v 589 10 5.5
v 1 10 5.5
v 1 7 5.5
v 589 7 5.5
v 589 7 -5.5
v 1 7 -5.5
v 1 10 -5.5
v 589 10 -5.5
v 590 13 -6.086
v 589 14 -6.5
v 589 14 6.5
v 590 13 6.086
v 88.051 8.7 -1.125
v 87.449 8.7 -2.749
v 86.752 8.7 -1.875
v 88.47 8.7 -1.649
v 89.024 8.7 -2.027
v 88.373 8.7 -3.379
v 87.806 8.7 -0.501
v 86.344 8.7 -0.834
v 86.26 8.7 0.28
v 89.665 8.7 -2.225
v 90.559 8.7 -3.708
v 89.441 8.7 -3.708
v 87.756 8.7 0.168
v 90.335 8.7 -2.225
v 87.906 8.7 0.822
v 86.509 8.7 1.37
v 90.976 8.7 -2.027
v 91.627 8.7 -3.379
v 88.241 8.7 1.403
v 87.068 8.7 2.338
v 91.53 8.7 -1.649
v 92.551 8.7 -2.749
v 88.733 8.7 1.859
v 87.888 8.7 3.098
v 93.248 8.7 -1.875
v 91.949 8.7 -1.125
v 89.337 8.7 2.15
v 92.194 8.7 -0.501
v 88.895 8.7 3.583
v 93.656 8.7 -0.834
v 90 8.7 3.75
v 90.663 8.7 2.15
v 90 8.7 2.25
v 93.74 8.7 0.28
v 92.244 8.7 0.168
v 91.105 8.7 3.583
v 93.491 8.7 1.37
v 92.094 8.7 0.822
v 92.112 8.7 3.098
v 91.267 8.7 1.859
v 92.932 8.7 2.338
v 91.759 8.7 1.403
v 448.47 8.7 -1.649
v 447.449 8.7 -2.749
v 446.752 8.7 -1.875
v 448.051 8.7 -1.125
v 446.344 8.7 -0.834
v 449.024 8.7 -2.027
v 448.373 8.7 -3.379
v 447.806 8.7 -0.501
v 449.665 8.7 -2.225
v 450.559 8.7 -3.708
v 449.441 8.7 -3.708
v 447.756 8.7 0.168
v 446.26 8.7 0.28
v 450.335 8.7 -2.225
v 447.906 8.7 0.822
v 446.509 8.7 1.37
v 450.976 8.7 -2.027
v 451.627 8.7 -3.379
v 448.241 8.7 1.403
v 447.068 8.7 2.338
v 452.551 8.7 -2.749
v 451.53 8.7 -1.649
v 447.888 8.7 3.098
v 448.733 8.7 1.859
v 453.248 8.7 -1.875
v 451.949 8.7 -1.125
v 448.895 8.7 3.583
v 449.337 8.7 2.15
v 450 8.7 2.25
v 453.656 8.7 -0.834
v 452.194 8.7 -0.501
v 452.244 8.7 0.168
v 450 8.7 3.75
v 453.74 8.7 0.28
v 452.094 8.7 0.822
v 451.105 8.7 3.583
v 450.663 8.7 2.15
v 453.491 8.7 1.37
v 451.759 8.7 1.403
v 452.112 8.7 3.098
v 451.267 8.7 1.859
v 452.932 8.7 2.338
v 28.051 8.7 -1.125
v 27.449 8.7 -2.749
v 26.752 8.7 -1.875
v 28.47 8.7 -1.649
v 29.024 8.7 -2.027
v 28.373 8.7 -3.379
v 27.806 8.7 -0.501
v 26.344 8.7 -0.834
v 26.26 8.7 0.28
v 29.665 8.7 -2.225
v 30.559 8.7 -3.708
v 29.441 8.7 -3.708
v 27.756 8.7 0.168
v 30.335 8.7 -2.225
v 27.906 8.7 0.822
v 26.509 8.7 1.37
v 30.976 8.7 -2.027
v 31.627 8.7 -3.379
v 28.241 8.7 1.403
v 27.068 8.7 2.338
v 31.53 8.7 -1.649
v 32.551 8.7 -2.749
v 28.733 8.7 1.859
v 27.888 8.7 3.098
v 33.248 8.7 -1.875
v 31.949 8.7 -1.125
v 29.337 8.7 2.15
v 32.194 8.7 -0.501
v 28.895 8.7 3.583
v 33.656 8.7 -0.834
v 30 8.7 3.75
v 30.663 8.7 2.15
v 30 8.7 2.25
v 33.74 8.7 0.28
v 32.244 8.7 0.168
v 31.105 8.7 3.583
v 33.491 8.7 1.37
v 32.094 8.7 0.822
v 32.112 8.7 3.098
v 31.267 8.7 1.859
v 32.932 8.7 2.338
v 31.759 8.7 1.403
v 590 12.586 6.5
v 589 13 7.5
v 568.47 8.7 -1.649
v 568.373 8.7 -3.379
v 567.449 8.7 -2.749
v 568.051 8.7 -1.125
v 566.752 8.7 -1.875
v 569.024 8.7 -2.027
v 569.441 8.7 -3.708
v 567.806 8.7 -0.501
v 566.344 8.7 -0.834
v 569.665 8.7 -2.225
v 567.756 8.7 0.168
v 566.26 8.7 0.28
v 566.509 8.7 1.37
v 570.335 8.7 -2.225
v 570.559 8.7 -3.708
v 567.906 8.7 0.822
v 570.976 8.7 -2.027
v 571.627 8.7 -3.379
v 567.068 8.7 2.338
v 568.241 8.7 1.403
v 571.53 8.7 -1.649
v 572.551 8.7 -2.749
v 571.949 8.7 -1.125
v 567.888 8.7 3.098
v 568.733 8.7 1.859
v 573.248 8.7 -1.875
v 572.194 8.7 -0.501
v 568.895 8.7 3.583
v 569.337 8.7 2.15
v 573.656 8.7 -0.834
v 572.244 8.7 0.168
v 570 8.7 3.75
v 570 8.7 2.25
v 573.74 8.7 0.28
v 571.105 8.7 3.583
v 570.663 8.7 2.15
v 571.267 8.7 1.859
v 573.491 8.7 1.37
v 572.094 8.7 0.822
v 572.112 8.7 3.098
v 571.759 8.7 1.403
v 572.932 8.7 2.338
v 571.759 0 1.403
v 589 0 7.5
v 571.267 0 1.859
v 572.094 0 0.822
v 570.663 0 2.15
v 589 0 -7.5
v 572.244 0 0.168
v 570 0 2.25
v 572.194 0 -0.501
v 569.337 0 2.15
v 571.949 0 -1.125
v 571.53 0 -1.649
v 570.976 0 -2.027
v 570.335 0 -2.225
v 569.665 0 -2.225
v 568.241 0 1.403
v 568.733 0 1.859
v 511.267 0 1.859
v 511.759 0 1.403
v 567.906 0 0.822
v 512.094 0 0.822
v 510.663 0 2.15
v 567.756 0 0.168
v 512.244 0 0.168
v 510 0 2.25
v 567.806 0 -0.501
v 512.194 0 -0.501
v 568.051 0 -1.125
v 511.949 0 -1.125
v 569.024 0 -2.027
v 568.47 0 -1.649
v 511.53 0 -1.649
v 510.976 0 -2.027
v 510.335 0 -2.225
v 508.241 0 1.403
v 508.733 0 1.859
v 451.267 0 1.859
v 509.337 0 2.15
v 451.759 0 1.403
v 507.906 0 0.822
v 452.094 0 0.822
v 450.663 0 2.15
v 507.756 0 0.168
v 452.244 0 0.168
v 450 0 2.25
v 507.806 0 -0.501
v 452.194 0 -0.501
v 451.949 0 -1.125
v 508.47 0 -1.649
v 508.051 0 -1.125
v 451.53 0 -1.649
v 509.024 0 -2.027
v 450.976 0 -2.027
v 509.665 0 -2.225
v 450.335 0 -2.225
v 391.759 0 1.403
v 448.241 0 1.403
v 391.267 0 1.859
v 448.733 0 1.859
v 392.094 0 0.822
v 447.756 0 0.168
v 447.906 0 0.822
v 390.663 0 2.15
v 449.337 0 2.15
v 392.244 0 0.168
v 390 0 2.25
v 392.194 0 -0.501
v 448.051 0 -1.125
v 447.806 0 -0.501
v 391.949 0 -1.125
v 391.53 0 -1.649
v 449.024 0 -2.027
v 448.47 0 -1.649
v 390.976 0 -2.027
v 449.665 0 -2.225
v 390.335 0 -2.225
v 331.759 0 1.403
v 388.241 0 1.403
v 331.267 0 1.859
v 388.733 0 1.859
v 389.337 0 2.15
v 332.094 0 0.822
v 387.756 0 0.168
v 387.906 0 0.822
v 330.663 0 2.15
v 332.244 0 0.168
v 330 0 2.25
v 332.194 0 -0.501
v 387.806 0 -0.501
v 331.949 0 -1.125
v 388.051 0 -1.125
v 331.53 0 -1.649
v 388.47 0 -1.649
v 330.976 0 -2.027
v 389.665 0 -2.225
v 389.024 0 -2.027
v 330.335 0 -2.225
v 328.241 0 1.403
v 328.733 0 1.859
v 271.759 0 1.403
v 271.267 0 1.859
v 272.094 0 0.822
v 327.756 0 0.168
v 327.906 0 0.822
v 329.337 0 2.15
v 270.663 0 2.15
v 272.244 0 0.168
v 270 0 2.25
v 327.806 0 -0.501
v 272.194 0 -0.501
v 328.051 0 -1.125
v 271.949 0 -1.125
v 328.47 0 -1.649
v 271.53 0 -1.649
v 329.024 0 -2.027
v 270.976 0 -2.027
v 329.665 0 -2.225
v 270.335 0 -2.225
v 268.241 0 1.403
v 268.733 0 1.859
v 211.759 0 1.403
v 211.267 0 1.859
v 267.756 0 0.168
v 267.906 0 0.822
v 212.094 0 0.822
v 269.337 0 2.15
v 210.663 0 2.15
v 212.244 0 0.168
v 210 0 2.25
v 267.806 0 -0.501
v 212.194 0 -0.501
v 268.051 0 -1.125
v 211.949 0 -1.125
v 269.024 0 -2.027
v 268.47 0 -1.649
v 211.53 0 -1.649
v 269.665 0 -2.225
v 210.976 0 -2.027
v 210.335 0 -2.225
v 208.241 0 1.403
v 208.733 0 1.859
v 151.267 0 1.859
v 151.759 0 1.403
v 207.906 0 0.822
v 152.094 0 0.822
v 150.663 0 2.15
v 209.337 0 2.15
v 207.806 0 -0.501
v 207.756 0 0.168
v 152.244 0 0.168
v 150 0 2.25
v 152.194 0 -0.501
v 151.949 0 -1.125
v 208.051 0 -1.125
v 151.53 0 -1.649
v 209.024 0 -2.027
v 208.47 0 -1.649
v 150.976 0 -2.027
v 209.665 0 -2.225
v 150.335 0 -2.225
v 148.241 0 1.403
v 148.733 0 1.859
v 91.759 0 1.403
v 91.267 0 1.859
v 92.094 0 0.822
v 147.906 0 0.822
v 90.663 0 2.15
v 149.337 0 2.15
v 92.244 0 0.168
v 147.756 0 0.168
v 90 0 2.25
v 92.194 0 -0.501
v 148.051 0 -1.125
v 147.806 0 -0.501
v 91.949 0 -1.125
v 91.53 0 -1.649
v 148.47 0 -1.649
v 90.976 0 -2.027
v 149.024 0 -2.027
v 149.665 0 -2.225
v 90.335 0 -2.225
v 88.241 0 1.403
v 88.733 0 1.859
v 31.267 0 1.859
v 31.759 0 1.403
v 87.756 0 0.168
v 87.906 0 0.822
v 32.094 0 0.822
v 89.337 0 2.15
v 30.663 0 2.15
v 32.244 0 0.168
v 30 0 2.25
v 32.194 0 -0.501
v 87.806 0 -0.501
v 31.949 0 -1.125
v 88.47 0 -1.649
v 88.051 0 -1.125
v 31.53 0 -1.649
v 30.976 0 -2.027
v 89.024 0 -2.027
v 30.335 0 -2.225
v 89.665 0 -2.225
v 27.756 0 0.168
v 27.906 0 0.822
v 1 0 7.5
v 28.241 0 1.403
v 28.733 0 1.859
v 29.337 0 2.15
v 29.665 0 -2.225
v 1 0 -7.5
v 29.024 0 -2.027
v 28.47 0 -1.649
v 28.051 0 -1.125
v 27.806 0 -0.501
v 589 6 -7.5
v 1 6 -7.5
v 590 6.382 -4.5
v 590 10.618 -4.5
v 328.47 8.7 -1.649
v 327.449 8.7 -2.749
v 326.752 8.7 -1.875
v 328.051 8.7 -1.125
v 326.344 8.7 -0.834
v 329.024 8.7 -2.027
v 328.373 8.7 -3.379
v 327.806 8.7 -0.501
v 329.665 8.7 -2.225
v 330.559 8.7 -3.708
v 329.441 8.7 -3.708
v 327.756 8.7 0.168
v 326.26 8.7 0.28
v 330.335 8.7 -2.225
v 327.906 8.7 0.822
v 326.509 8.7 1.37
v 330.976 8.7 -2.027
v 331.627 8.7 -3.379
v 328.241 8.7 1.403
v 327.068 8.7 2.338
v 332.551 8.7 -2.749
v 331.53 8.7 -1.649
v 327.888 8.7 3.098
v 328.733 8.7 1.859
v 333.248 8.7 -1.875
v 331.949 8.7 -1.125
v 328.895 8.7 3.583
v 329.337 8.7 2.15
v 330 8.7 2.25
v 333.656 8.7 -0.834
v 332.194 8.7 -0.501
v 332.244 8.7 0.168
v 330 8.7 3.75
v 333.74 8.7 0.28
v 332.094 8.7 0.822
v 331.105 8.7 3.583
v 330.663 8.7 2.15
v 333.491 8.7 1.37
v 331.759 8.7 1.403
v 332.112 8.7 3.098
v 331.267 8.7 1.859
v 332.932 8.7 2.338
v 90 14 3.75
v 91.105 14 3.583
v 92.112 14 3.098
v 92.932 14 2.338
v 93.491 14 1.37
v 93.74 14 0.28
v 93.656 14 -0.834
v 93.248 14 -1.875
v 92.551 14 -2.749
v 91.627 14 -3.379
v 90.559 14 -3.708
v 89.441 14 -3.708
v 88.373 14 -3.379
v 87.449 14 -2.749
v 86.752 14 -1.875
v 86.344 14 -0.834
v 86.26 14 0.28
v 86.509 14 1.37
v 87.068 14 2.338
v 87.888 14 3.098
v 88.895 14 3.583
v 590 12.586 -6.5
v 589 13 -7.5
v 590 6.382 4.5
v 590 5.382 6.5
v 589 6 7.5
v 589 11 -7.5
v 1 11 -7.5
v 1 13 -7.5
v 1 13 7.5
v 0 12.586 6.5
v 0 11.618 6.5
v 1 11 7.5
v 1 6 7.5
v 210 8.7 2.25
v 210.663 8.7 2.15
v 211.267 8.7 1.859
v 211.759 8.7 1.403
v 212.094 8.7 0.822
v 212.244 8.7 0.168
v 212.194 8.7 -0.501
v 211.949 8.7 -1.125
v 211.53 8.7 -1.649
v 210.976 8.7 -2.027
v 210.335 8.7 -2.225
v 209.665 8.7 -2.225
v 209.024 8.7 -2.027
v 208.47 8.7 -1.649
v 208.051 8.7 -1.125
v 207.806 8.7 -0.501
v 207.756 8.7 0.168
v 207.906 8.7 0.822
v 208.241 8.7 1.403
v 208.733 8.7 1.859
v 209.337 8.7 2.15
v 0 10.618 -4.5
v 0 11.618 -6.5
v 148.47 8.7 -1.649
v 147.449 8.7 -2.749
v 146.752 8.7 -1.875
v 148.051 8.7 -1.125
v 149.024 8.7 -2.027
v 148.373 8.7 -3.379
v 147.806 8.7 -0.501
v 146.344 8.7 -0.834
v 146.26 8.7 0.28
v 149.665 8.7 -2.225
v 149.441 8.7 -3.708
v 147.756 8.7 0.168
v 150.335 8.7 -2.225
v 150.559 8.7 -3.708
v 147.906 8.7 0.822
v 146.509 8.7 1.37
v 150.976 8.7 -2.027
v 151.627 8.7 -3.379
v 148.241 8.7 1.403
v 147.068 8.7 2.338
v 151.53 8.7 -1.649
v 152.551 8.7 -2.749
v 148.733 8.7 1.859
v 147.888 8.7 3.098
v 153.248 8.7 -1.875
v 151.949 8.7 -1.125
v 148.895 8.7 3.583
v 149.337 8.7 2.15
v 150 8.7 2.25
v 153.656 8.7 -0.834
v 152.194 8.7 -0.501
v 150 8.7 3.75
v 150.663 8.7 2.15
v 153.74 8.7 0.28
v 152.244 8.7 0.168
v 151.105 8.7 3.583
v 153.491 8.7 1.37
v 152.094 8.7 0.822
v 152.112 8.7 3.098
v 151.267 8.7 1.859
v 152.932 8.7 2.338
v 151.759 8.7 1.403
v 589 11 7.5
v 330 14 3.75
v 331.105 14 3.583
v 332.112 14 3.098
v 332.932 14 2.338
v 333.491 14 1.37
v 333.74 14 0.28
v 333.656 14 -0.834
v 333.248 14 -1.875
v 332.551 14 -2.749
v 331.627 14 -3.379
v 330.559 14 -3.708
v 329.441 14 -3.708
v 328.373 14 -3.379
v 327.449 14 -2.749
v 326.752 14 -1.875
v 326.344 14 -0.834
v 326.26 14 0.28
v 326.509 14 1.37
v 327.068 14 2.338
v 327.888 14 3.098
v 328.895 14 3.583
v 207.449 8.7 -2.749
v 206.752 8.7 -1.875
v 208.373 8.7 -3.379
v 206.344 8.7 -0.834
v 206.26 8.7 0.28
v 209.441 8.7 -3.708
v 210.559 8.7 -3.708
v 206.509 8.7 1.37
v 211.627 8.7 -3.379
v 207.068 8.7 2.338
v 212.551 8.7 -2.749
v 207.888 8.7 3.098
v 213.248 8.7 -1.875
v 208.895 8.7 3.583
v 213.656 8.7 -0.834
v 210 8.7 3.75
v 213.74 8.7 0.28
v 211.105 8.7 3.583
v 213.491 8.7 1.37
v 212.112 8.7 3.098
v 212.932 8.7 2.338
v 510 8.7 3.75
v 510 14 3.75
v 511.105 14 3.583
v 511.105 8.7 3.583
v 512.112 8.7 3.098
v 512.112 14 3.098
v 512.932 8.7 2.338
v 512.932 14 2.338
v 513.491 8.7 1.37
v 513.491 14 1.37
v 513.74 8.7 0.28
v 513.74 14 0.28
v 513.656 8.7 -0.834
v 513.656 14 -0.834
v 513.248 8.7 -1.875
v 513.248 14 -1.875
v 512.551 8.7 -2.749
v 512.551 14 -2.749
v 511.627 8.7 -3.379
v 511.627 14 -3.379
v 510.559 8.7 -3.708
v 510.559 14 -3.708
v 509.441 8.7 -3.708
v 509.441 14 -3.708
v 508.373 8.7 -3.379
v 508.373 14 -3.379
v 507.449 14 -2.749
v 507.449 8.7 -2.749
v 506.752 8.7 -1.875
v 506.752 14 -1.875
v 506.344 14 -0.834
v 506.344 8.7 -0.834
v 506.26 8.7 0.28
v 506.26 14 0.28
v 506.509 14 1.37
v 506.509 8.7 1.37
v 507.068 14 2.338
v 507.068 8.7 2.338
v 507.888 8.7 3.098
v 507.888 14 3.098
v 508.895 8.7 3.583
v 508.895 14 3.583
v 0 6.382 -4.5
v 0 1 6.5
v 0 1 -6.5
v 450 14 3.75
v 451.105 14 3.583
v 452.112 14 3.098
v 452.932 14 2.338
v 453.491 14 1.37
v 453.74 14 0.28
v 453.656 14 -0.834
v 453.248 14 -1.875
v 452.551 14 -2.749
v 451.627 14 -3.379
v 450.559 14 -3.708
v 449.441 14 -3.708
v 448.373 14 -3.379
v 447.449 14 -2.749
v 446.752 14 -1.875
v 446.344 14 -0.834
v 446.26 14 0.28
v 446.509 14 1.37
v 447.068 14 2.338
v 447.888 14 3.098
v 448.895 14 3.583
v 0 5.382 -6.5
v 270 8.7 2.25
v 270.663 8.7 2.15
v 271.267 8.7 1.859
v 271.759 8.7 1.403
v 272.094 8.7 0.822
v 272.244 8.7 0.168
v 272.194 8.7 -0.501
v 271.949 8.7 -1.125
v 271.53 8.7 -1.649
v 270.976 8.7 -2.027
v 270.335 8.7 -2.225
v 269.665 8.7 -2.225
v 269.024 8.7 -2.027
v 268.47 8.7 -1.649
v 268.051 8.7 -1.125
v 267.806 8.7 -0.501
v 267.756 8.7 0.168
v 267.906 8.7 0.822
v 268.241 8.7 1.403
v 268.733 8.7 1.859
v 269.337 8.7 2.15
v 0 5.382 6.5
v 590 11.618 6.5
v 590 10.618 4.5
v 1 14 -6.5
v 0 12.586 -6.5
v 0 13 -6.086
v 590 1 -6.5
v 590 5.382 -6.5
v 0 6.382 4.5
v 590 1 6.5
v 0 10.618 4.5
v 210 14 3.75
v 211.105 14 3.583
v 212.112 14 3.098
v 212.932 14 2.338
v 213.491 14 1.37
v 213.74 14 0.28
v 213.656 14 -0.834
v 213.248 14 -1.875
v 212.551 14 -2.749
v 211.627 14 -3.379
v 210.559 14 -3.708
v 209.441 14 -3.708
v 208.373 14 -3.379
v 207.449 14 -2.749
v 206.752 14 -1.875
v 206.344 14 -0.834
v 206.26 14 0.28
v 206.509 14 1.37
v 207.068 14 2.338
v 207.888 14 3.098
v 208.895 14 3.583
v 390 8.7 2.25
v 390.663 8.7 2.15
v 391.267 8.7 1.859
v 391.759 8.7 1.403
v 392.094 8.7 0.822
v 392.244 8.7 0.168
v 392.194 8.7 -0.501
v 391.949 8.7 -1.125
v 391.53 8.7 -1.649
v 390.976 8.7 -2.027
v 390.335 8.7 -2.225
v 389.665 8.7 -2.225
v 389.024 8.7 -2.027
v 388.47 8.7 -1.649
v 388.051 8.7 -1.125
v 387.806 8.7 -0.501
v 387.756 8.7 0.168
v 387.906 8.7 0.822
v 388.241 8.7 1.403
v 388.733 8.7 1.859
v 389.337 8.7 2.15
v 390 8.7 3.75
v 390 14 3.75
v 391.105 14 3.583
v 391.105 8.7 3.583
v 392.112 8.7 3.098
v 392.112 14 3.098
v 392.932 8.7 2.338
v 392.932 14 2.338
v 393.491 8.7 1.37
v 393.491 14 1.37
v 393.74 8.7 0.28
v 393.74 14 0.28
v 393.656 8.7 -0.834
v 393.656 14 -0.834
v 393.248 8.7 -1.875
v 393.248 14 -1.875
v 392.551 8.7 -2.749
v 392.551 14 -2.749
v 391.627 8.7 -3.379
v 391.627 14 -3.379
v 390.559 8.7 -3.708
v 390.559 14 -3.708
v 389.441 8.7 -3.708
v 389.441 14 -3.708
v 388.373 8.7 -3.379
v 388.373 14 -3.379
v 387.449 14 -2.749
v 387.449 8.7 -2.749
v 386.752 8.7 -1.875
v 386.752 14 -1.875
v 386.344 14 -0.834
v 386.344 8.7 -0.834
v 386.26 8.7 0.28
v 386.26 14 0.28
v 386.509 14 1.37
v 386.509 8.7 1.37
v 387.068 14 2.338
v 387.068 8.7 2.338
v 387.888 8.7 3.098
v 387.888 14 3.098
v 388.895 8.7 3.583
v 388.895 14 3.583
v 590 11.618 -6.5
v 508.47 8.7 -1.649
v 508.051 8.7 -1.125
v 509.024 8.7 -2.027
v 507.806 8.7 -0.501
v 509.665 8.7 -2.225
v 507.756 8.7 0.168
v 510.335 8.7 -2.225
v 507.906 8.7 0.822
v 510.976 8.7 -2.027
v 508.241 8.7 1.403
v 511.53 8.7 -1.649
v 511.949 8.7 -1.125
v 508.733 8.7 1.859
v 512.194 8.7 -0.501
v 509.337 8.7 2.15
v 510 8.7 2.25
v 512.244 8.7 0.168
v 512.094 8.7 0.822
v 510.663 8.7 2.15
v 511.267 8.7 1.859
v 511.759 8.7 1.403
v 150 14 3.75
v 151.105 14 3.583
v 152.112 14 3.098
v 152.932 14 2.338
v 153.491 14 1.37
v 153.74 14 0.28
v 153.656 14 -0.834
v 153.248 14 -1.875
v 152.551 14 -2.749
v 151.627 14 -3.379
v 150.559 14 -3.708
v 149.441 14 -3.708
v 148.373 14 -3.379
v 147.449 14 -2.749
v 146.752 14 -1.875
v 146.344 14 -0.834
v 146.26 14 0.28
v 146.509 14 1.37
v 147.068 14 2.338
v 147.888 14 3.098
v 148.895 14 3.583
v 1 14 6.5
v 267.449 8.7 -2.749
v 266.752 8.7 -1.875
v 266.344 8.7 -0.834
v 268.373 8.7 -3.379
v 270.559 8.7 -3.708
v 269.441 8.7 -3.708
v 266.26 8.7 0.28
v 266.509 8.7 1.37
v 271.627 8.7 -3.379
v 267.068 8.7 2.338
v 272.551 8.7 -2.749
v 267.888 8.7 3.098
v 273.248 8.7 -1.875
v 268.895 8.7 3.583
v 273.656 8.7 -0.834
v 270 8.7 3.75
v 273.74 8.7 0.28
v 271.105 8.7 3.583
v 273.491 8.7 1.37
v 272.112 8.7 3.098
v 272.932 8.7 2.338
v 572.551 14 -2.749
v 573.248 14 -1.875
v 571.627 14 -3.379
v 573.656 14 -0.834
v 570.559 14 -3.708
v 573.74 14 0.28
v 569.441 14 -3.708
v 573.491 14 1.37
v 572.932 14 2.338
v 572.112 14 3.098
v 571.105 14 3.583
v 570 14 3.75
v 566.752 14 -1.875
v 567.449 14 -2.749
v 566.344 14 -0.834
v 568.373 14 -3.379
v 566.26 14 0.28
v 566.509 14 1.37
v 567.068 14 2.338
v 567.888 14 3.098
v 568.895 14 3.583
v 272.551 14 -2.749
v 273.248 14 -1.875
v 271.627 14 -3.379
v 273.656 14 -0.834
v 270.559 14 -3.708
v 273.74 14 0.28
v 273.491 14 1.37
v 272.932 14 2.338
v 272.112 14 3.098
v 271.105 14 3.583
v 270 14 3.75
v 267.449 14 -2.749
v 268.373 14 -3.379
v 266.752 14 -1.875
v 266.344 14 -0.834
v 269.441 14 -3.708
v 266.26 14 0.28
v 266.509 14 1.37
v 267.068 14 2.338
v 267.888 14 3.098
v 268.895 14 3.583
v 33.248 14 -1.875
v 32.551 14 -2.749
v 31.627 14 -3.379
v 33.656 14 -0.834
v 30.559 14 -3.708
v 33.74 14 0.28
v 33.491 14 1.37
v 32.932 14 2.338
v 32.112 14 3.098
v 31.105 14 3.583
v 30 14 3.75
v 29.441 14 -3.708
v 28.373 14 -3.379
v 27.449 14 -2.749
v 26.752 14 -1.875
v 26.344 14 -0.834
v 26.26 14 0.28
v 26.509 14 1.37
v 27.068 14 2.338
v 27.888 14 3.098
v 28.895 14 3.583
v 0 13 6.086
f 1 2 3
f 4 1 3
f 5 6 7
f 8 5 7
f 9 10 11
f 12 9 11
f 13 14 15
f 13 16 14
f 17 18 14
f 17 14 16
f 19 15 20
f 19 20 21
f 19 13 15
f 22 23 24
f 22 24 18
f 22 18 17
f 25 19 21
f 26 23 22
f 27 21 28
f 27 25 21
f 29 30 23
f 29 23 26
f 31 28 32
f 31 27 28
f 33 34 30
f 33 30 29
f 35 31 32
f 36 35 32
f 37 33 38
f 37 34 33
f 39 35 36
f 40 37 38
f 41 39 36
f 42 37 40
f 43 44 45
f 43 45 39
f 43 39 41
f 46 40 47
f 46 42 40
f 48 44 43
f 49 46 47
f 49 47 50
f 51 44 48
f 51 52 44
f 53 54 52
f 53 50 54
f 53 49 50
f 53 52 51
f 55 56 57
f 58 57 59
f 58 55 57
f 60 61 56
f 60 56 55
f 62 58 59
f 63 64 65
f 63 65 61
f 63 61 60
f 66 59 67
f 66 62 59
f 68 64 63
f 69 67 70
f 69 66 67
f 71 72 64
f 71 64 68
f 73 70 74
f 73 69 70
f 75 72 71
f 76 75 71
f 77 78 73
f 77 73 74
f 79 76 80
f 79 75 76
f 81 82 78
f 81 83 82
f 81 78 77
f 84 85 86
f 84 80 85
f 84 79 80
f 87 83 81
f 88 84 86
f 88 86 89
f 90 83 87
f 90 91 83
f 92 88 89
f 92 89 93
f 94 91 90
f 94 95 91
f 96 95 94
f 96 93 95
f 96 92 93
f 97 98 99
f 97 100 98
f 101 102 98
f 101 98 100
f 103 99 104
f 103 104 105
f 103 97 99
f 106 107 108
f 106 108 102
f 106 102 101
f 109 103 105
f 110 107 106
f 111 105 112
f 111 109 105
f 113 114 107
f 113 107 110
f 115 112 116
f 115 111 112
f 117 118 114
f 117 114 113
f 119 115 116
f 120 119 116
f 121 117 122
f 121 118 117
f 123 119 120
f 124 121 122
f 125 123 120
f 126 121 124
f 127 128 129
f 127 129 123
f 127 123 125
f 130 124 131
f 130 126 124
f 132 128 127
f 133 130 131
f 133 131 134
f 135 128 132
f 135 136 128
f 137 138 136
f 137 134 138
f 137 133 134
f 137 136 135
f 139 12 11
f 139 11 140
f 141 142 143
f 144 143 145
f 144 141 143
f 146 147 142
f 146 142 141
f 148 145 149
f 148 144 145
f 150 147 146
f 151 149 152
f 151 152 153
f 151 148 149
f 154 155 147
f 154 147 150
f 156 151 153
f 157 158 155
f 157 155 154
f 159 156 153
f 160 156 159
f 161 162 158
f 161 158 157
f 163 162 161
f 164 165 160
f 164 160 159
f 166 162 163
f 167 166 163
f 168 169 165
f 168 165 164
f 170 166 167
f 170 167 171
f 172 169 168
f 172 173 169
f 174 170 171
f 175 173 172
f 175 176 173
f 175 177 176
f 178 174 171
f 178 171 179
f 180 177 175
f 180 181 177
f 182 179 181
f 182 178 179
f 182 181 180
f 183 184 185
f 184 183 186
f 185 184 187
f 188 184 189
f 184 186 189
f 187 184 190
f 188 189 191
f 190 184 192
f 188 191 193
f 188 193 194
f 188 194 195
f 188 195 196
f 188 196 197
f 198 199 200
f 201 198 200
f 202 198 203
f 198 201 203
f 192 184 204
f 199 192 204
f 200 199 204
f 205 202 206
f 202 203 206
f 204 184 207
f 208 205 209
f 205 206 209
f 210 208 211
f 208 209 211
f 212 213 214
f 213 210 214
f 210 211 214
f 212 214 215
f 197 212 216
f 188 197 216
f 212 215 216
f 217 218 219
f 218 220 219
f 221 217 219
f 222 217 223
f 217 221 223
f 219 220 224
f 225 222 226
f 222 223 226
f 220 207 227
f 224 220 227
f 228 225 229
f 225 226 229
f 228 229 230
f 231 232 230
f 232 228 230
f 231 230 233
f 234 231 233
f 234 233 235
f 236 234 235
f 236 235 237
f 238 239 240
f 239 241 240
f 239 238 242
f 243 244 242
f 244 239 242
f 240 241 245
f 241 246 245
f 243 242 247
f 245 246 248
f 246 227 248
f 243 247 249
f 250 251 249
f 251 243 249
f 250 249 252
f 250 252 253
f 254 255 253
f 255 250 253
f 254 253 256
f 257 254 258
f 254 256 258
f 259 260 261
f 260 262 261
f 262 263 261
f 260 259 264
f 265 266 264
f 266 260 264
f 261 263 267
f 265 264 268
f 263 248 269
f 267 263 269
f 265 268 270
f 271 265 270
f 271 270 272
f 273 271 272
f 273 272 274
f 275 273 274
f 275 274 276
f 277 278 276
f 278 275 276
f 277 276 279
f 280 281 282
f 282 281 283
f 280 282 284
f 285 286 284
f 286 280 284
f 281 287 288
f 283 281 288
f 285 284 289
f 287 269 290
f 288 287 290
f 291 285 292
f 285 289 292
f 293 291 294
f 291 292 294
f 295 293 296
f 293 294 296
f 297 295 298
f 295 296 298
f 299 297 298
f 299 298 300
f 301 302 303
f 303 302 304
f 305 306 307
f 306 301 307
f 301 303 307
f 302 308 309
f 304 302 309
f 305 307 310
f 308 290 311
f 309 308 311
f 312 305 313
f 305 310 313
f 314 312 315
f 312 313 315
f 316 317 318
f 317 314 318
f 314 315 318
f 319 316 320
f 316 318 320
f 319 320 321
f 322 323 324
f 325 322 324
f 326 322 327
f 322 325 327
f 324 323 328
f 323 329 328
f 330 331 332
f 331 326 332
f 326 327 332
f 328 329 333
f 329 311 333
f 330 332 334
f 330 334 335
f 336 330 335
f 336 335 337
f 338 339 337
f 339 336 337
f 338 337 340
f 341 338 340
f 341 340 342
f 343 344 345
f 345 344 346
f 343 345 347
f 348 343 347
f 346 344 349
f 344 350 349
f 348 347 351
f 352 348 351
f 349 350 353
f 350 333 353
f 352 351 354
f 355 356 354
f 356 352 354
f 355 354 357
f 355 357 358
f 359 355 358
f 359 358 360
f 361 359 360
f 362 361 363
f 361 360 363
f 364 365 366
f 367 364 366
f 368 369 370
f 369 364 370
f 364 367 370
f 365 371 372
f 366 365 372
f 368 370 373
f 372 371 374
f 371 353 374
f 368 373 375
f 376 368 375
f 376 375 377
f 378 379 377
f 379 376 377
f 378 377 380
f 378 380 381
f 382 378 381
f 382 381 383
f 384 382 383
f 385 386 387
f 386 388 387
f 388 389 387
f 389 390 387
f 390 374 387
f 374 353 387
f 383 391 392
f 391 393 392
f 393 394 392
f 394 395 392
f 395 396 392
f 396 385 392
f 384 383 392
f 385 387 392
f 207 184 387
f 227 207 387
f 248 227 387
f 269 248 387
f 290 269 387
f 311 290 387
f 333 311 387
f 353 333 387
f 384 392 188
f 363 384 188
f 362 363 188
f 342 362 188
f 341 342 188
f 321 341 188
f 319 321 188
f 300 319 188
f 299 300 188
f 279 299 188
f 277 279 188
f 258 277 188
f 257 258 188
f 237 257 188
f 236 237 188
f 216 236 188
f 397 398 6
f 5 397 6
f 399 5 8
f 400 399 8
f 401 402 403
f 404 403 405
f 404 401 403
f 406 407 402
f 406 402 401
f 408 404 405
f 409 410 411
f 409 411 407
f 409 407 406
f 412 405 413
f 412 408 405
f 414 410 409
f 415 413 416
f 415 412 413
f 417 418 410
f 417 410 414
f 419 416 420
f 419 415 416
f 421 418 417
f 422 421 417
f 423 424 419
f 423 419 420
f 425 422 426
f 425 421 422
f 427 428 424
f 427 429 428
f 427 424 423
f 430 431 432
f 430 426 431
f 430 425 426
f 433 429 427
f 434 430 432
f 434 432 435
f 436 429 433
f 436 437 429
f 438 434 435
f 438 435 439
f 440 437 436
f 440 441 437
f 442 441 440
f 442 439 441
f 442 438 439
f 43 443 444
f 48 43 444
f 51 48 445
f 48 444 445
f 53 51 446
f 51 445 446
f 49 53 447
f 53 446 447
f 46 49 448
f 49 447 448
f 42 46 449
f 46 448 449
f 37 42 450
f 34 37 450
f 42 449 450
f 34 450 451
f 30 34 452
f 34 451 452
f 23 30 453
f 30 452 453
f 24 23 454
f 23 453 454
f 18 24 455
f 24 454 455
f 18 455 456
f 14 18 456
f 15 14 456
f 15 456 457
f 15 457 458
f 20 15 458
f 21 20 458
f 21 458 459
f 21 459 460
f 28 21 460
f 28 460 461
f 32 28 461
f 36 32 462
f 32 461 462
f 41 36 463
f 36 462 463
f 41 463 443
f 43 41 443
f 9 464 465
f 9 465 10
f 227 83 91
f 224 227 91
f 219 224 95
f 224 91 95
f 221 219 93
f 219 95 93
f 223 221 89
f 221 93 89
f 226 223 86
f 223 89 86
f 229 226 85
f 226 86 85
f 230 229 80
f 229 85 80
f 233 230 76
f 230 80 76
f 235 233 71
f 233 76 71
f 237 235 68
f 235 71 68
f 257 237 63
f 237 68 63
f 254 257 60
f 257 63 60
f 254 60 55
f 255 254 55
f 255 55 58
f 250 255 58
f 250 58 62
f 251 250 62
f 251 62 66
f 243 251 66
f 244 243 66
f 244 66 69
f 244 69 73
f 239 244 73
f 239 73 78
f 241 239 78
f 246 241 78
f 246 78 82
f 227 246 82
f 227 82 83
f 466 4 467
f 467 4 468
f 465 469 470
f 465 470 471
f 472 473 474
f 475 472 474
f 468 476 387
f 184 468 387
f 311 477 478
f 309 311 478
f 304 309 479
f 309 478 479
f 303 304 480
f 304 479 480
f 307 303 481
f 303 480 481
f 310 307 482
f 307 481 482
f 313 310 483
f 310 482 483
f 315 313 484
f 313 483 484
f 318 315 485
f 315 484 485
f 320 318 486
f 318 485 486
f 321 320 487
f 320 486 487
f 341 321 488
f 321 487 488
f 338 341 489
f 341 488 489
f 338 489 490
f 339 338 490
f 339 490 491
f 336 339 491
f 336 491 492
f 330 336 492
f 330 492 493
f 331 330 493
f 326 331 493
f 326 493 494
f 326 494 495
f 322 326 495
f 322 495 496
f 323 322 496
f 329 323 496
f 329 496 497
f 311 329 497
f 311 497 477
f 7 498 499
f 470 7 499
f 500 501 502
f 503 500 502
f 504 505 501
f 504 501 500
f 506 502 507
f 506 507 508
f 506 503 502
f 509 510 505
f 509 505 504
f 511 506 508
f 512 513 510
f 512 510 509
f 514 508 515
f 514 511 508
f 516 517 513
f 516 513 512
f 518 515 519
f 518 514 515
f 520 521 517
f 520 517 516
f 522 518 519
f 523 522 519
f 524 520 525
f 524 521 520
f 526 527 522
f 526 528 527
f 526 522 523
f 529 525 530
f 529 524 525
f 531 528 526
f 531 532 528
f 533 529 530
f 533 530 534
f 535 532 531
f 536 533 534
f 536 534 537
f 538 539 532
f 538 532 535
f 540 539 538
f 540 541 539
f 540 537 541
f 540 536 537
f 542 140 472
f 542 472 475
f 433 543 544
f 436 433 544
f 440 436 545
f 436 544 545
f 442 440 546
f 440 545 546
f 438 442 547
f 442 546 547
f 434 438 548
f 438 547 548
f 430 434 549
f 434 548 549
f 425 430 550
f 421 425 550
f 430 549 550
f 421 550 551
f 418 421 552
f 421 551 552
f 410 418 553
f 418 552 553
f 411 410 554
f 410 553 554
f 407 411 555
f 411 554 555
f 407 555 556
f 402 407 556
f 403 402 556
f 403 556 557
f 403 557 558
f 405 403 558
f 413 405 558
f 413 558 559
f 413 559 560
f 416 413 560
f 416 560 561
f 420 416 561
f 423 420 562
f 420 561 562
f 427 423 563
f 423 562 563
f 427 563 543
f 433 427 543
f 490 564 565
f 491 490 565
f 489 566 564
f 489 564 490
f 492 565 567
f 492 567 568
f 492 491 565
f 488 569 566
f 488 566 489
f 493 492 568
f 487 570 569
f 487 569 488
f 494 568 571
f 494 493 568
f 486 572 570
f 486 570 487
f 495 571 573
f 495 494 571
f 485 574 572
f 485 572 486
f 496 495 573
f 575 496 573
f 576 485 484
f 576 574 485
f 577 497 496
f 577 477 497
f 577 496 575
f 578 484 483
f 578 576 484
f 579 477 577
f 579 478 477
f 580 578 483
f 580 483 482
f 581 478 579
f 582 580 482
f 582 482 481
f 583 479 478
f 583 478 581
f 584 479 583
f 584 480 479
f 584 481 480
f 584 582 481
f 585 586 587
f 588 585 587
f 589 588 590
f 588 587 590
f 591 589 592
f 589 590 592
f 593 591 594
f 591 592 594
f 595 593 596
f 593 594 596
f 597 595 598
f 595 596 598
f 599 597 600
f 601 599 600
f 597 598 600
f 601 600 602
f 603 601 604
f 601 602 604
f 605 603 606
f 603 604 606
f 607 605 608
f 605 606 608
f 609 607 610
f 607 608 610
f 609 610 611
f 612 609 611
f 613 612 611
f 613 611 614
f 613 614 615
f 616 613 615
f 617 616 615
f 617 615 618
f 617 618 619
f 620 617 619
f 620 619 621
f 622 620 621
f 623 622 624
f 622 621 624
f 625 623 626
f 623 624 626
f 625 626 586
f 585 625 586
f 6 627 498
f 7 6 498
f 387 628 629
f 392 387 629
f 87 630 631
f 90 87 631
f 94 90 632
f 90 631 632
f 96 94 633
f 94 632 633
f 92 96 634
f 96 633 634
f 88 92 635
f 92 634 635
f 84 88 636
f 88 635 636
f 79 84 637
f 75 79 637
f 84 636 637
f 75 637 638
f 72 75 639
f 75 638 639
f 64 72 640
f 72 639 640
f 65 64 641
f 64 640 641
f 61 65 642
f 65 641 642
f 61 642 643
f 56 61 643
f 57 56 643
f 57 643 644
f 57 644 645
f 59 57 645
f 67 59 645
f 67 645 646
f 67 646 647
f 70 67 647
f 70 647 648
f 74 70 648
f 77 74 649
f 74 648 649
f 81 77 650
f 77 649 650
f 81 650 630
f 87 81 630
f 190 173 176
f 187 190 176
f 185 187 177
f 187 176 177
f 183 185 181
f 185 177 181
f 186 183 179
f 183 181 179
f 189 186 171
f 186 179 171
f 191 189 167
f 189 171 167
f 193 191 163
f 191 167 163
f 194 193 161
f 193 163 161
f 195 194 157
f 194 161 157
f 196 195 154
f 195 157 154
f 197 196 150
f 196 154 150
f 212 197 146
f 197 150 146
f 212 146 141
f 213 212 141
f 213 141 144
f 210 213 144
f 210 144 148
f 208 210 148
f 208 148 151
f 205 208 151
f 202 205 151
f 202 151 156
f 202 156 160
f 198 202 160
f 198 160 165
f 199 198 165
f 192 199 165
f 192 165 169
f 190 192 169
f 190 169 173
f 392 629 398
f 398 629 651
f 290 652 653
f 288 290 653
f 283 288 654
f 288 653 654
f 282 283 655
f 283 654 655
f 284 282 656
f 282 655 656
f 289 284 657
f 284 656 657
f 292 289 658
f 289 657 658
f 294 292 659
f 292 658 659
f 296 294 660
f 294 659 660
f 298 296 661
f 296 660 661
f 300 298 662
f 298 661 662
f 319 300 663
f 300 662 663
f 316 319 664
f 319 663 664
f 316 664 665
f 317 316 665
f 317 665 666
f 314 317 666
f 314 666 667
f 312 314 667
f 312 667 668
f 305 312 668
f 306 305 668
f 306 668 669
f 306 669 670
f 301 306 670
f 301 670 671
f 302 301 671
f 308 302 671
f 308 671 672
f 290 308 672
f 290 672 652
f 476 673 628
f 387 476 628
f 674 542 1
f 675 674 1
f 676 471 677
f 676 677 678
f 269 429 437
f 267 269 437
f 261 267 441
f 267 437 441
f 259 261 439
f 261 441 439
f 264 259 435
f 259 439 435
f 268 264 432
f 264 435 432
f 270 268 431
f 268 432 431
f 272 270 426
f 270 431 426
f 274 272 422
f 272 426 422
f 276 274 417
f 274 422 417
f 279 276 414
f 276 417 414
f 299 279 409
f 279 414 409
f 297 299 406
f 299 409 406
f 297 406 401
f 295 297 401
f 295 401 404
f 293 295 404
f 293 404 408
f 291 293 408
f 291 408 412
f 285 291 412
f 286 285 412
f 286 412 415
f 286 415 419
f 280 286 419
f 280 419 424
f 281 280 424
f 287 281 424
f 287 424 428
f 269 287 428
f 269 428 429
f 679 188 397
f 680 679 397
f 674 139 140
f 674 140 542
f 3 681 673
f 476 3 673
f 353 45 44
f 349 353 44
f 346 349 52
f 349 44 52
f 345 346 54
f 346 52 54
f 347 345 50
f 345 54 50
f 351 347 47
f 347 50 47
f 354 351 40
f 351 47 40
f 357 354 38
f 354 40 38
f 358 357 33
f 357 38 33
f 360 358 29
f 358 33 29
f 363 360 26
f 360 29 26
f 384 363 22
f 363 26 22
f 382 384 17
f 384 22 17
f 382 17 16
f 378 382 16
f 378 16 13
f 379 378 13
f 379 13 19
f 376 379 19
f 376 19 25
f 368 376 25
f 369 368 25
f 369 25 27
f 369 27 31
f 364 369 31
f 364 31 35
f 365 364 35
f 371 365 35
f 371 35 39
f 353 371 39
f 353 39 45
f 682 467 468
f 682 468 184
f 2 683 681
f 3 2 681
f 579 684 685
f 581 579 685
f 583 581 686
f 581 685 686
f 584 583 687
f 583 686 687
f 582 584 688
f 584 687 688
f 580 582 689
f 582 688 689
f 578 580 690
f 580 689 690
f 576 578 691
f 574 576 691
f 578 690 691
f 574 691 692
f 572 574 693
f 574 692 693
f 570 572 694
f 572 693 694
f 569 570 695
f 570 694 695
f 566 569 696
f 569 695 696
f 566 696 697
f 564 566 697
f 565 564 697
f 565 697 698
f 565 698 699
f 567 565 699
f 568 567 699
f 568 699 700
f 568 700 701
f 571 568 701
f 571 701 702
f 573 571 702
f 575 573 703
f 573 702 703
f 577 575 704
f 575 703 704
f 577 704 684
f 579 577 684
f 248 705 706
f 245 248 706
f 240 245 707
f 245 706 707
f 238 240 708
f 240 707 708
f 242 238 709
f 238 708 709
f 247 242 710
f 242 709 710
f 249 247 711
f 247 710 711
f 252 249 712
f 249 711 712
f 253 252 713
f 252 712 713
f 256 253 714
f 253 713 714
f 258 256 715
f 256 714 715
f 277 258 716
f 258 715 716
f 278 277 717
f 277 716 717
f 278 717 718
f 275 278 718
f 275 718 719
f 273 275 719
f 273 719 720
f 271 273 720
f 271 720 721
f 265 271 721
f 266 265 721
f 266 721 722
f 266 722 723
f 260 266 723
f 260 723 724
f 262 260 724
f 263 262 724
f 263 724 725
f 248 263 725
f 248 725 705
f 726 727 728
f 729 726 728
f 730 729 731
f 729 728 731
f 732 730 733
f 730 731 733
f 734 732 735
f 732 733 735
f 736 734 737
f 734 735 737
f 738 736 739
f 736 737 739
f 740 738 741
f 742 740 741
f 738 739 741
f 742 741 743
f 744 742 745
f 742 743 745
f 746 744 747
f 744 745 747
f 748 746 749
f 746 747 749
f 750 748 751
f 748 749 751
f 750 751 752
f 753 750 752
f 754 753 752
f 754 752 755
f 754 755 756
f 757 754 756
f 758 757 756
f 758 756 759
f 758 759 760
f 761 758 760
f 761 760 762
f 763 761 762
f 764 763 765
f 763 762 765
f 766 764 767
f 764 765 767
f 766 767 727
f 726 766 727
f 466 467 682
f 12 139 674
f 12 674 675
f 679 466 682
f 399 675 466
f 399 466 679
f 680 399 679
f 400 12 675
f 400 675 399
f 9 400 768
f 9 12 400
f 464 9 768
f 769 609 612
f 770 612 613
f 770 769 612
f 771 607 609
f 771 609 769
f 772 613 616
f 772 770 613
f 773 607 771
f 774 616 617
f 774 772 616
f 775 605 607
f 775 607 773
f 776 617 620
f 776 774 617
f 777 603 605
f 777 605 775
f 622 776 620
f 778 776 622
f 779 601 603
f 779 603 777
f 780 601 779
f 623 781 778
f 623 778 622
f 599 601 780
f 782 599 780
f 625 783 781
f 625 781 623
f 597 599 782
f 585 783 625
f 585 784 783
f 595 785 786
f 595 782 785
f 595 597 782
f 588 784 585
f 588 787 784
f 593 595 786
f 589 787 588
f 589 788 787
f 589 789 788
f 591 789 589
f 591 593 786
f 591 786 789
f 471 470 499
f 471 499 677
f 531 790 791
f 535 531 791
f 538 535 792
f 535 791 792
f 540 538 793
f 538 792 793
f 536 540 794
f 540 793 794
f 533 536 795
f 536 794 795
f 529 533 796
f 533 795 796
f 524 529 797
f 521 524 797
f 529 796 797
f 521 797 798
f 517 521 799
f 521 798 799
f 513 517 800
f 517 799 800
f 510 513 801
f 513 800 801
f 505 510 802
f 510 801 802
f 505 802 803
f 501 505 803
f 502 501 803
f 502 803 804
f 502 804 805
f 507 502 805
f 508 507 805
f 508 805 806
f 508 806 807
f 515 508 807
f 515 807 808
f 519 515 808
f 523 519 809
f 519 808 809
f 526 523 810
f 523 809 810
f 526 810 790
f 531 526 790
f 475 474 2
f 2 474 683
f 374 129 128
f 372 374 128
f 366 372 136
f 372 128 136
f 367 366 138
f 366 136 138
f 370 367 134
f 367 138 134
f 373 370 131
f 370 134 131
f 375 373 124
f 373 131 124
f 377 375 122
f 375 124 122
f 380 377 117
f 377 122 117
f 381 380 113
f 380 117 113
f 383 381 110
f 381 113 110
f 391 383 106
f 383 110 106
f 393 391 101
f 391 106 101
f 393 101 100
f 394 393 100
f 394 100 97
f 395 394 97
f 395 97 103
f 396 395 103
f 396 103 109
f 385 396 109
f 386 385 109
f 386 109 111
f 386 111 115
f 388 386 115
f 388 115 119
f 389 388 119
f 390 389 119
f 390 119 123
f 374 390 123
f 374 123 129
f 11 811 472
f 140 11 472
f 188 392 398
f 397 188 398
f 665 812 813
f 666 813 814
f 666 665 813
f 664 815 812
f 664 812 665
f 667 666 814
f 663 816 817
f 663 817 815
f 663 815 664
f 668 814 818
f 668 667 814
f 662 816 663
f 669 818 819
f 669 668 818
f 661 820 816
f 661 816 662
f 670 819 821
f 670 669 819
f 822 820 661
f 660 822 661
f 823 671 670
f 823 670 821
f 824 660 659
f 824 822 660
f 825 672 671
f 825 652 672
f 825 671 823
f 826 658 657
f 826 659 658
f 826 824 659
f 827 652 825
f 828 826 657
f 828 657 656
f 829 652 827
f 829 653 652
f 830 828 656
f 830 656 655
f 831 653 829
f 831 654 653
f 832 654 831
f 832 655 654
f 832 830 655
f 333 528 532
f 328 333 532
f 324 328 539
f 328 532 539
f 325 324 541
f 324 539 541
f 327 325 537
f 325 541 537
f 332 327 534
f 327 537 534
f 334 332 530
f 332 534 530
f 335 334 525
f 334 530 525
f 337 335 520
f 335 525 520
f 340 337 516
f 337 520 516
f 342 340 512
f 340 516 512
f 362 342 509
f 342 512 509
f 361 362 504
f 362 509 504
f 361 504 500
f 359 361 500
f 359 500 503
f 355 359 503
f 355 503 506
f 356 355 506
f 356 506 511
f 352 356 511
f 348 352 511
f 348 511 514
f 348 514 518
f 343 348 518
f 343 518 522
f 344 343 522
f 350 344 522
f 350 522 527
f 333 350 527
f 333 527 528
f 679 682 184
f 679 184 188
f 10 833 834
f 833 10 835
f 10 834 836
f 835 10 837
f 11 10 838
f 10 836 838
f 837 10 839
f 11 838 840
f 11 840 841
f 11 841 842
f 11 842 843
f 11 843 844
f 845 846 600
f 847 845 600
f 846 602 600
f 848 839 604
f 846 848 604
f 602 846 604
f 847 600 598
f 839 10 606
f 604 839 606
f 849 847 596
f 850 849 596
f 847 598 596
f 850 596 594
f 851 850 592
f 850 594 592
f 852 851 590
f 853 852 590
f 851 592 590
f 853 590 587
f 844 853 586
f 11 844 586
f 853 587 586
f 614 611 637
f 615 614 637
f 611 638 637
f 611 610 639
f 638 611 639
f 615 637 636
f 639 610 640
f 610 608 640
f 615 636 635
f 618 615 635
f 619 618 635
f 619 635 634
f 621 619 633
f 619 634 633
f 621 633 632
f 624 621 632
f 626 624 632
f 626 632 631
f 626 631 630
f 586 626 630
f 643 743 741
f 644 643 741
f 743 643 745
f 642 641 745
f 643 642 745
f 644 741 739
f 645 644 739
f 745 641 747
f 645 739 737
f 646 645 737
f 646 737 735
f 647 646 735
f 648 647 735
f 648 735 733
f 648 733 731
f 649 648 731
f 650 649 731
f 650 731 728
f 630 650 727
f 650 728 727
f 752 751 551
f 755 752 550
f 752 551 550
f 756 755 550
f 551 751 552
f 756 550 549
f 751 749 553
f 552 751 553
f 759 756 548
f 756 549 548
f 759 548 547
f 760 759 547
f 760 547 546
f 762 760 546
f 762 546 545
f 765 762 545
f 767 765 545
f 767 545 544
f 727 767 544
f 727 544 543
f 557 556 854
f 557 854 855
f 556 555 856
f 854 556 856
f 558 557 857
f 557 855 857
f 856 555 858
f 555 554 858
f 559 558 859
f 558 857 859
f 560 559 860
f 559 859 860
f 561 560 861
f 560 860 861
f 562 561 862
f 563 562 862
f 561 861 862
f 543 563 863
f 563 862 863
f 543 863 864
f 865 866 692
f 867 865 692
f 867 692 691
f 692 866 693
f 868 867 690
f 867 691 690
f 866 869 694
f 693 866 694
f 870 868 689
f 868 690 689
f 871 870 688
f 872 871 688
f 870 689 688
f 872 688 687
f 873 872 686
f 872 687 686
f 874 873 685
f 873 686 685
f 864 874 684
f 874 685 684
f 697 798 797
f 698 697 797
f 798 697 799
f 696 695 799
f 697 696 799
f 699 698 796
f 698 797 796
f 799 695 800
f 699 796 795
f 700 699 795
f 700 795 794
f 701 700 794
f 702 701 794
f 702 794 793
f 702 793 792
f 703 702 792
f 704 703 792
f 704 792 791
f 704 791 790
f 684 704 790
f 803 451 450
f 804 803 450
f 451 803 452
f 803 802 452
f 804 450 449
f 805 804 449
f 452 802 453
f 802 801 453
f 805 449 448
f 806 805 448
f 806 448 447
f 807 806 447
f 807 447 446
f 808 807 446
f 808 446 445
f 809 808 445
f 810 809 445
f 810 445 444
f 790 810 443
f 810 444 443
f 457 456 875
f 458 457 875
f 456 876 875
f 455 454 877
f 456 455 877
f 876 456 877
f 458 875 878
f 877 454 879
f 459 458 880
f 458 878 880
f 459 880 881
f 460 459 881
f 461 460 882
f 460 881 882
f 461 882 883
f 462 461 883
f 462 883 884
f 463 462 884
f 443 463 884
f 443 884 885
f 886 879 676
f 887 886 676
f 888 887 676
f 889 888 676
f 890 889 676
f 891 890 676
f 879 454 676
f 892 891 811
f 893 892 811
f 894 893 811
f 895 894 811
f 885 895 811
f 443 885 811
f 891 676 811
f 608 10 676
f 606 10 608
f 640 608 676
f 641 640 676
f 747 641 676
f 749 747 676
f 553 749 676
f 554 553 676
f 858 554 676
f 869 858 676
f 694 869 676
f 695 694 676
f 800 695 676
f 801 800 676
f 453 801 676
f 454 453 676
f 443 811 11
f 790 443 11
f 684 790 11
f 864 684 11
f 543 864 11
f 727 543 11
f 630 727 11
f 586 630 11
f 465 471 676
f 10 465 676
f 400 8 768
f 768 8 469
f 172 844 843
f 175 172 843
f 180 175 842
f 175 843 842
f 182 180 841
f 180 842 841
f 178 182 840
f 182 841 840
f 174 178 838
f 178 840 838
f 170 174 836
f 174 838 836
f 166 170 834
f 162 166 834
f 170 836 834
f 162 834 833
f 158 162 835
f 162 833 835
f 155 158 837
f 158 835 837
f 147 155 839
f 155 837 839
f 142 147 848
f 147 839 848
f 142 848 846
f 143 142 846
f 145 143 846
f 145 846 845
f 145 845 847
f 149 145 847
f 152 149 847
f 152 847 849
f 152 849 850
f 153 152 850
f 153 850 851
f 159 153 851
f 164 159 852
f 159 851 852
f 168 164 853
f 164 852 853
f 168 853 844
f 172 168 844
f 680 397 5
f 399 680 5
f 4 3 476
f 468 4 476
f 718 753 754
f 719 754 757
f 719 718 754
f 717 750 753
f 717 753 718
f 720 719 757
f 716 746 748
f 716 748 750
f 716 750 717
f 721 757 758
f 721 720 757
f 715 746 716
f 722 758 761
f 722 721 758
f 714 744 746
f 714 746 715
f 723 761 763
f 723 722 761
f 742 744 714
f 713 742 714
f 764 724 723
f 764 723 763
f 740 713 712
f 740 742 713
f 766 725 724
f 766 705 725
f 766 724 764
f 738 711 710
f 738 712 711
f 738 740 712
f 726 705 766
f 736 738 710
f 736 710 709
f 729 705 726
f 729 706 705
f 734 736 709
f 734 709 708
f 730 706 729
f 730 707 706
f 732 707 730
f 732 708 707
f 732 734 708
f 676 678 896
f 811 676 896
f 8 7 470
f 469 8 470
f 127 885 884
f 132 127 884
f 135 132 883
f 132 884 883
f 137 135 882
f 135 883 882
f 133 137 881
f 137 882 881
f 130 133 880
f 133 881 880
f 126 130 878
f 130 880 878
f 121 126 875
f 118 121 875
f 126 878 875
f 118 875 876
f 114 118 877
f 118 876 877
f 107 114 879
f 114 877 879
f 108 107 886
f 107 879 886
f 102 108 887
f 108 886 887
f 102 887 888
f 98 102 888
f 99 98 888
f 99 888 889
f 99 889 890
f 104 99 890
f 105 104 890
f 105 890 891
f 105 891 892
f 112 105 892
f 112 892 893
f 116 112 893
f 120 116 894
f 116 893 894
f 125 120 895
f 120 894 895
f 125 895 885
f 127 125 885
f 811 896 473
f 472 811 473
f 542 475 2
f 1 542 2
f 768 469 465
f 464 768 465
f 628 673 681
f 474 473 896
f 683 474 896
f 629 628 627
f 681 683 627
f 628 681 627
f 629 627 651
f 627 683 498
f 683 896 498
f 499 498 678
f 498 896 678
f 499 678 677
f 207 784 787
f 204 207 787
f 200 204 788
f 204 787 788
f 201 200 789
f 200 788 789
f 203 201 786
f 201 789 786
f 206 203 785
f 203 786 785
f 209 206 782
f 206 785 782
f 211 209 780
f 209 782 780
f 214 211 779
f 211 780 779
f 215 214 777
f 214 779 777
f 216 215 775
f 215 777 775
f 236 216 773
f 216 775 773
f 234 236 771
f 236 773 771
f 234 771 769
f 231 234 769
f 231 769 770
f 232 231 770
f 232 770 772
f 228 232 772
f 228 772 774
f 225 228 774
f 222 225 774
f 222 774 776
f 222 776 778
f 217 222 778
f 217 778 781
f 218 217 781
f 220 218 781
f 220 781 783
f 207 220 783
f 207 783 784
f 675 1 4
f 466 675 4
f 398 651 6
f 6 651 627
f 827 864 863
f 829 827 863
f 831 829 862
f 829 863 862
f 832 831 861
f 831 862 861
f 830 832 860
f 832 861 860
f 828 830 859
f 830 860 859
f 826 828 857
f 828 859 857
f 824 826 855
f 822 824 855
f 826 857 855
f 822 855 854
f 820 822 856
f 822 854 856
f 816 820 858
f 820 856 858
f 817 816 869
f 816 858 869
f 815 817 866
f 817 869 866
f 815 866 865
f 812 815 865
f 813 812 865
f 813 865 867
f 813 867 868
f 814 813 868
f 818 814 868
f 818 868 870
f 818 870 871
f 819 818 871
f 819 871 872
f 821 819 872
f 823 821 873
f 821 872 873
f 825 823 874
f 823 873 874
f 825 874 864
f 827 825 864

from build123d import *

# Parameters (mm, degrees)
BOSS_EXTRUDE1_DEPTH = 590
CHAMFER1_SIZE       = 1
CHAMFER2_SIZE       = 1
SKETCH2_R           = 3.75
CUT_EXTRUDE1_DEPTH  = 5.3
SKETCH3_R           = 2.25
CUT_EXTRUDE2_DEPTH  = 591.111802966
LPATTERN1_COUNT     = 67
LPATTERN1_PITCH     = 60


with BuildPart() as part:
    # Sketch1 → Boss-Extrude1 (new body)
    with BuildSketch(Plane(origin=(0, 0, 0), x_dir=(0, 0, -1), z_dir=(1, 0, 0))):
        Polygon((-7.5, 0), (7.5, 0), (7.5, 6), (5.5, 7), (5.5, 10), (7.5, 11), (7.5, 13), (6.5, 14), (-6.5, 14), (-7.5, 13), (-7.5, 11), (-5.5, 10), (-5.5, 7), (-7.5, 6), align=None)
    extrude(amount=BOSS_EXTRUDE1_DEPTH)

    # Chamfer1
    chamfer1_edges = [part.edges().sort_by_distance(p)[0] for p in [
        (0, 6.5, 6.5),
        (0, 8.5, 5.5),
        (0, 10.5, 6.5),
        (0, 12, 7.5),
        (0, 13.5, 7),
        (0, 14, 0),
        (0, 13.5, -7),
        (0, 12, -7.5),
        (0, 10.5, -6.5),
        (0, 8.5, -5.5),
        (0, 6.5, -6.5),
        (0, 3, -7.5),
        (0, 0, 0),
        (0, 3, 7.5),
    ]]
    chamfer(chamfer1_edges, length=CHAMFER1_SIZE)

    # Chamfer2
    chamfer2_edges = [part.edges().sort_by_distance(p)[0] for p in [
        (590, 3, -7.5),
        (590, 6.5, -6.5),
        (590, 8.5, -5.5),
        (590, 10.5, -6.5),
        (590, 12, -7.5),
        (590, 13.5, -7),
        (590, 14, 0),
        (590, 13.5, 7),
        (590, 12, 7.5),
        (590, 10.5, 6.5),
        (590, 3, 7.5),
        (590, 8.5, 5.5),
        (590, 6.5, 6.5),
        (590, 0, 0),
    ]]
    chamfer(chamfer2_edges, length=CHAMFER2_SIZE)

    # Sketch2 → Cut-Extrude1 (cut)
    with BuildSketch(Plane(origin=(0, 14, 0), x_dir=(1, 0, 0), z_dir=(0, 1, 0))):
        with Locations(Location((570, 0, 0), (0, 0, 270))):
            Circle(SKETCH2_R)
    cut_extrude1 = extrude(amount=-CUT_EXTRUDE1_DEPTH, mode=Mode.SUBTRACT)

    # Sketch3 → Cut-Extrude2 (cut, through all)
    with BuildSketch(Plane(origin=(0, 8.7, 0), x_dir=(1, 0, 0), z_dir=(0, 1, 0))):
        with Locations(Location((570, 0, 0), (0, 0, 270))):
            Circle(SKETCH3_R)
    cut_extrude2 = extrude(amount=-CUT_EXTRUDE2_DEPTH, mode=Mode.SUBTRACT)

    # LPattern1: Cut-Extrude1, Cut-Extrude2 ×67
    with Locations(*[(-i * LPATTERN1_PITCH, 0, 0) for i in range(1, LPATTERN1_COUNT)]):
        add(cut_extrude1, mode=Mode.SUBTRACT)
        add(cut_extrude2, mode=Mode.SUBTRACT)


solid = part.part
